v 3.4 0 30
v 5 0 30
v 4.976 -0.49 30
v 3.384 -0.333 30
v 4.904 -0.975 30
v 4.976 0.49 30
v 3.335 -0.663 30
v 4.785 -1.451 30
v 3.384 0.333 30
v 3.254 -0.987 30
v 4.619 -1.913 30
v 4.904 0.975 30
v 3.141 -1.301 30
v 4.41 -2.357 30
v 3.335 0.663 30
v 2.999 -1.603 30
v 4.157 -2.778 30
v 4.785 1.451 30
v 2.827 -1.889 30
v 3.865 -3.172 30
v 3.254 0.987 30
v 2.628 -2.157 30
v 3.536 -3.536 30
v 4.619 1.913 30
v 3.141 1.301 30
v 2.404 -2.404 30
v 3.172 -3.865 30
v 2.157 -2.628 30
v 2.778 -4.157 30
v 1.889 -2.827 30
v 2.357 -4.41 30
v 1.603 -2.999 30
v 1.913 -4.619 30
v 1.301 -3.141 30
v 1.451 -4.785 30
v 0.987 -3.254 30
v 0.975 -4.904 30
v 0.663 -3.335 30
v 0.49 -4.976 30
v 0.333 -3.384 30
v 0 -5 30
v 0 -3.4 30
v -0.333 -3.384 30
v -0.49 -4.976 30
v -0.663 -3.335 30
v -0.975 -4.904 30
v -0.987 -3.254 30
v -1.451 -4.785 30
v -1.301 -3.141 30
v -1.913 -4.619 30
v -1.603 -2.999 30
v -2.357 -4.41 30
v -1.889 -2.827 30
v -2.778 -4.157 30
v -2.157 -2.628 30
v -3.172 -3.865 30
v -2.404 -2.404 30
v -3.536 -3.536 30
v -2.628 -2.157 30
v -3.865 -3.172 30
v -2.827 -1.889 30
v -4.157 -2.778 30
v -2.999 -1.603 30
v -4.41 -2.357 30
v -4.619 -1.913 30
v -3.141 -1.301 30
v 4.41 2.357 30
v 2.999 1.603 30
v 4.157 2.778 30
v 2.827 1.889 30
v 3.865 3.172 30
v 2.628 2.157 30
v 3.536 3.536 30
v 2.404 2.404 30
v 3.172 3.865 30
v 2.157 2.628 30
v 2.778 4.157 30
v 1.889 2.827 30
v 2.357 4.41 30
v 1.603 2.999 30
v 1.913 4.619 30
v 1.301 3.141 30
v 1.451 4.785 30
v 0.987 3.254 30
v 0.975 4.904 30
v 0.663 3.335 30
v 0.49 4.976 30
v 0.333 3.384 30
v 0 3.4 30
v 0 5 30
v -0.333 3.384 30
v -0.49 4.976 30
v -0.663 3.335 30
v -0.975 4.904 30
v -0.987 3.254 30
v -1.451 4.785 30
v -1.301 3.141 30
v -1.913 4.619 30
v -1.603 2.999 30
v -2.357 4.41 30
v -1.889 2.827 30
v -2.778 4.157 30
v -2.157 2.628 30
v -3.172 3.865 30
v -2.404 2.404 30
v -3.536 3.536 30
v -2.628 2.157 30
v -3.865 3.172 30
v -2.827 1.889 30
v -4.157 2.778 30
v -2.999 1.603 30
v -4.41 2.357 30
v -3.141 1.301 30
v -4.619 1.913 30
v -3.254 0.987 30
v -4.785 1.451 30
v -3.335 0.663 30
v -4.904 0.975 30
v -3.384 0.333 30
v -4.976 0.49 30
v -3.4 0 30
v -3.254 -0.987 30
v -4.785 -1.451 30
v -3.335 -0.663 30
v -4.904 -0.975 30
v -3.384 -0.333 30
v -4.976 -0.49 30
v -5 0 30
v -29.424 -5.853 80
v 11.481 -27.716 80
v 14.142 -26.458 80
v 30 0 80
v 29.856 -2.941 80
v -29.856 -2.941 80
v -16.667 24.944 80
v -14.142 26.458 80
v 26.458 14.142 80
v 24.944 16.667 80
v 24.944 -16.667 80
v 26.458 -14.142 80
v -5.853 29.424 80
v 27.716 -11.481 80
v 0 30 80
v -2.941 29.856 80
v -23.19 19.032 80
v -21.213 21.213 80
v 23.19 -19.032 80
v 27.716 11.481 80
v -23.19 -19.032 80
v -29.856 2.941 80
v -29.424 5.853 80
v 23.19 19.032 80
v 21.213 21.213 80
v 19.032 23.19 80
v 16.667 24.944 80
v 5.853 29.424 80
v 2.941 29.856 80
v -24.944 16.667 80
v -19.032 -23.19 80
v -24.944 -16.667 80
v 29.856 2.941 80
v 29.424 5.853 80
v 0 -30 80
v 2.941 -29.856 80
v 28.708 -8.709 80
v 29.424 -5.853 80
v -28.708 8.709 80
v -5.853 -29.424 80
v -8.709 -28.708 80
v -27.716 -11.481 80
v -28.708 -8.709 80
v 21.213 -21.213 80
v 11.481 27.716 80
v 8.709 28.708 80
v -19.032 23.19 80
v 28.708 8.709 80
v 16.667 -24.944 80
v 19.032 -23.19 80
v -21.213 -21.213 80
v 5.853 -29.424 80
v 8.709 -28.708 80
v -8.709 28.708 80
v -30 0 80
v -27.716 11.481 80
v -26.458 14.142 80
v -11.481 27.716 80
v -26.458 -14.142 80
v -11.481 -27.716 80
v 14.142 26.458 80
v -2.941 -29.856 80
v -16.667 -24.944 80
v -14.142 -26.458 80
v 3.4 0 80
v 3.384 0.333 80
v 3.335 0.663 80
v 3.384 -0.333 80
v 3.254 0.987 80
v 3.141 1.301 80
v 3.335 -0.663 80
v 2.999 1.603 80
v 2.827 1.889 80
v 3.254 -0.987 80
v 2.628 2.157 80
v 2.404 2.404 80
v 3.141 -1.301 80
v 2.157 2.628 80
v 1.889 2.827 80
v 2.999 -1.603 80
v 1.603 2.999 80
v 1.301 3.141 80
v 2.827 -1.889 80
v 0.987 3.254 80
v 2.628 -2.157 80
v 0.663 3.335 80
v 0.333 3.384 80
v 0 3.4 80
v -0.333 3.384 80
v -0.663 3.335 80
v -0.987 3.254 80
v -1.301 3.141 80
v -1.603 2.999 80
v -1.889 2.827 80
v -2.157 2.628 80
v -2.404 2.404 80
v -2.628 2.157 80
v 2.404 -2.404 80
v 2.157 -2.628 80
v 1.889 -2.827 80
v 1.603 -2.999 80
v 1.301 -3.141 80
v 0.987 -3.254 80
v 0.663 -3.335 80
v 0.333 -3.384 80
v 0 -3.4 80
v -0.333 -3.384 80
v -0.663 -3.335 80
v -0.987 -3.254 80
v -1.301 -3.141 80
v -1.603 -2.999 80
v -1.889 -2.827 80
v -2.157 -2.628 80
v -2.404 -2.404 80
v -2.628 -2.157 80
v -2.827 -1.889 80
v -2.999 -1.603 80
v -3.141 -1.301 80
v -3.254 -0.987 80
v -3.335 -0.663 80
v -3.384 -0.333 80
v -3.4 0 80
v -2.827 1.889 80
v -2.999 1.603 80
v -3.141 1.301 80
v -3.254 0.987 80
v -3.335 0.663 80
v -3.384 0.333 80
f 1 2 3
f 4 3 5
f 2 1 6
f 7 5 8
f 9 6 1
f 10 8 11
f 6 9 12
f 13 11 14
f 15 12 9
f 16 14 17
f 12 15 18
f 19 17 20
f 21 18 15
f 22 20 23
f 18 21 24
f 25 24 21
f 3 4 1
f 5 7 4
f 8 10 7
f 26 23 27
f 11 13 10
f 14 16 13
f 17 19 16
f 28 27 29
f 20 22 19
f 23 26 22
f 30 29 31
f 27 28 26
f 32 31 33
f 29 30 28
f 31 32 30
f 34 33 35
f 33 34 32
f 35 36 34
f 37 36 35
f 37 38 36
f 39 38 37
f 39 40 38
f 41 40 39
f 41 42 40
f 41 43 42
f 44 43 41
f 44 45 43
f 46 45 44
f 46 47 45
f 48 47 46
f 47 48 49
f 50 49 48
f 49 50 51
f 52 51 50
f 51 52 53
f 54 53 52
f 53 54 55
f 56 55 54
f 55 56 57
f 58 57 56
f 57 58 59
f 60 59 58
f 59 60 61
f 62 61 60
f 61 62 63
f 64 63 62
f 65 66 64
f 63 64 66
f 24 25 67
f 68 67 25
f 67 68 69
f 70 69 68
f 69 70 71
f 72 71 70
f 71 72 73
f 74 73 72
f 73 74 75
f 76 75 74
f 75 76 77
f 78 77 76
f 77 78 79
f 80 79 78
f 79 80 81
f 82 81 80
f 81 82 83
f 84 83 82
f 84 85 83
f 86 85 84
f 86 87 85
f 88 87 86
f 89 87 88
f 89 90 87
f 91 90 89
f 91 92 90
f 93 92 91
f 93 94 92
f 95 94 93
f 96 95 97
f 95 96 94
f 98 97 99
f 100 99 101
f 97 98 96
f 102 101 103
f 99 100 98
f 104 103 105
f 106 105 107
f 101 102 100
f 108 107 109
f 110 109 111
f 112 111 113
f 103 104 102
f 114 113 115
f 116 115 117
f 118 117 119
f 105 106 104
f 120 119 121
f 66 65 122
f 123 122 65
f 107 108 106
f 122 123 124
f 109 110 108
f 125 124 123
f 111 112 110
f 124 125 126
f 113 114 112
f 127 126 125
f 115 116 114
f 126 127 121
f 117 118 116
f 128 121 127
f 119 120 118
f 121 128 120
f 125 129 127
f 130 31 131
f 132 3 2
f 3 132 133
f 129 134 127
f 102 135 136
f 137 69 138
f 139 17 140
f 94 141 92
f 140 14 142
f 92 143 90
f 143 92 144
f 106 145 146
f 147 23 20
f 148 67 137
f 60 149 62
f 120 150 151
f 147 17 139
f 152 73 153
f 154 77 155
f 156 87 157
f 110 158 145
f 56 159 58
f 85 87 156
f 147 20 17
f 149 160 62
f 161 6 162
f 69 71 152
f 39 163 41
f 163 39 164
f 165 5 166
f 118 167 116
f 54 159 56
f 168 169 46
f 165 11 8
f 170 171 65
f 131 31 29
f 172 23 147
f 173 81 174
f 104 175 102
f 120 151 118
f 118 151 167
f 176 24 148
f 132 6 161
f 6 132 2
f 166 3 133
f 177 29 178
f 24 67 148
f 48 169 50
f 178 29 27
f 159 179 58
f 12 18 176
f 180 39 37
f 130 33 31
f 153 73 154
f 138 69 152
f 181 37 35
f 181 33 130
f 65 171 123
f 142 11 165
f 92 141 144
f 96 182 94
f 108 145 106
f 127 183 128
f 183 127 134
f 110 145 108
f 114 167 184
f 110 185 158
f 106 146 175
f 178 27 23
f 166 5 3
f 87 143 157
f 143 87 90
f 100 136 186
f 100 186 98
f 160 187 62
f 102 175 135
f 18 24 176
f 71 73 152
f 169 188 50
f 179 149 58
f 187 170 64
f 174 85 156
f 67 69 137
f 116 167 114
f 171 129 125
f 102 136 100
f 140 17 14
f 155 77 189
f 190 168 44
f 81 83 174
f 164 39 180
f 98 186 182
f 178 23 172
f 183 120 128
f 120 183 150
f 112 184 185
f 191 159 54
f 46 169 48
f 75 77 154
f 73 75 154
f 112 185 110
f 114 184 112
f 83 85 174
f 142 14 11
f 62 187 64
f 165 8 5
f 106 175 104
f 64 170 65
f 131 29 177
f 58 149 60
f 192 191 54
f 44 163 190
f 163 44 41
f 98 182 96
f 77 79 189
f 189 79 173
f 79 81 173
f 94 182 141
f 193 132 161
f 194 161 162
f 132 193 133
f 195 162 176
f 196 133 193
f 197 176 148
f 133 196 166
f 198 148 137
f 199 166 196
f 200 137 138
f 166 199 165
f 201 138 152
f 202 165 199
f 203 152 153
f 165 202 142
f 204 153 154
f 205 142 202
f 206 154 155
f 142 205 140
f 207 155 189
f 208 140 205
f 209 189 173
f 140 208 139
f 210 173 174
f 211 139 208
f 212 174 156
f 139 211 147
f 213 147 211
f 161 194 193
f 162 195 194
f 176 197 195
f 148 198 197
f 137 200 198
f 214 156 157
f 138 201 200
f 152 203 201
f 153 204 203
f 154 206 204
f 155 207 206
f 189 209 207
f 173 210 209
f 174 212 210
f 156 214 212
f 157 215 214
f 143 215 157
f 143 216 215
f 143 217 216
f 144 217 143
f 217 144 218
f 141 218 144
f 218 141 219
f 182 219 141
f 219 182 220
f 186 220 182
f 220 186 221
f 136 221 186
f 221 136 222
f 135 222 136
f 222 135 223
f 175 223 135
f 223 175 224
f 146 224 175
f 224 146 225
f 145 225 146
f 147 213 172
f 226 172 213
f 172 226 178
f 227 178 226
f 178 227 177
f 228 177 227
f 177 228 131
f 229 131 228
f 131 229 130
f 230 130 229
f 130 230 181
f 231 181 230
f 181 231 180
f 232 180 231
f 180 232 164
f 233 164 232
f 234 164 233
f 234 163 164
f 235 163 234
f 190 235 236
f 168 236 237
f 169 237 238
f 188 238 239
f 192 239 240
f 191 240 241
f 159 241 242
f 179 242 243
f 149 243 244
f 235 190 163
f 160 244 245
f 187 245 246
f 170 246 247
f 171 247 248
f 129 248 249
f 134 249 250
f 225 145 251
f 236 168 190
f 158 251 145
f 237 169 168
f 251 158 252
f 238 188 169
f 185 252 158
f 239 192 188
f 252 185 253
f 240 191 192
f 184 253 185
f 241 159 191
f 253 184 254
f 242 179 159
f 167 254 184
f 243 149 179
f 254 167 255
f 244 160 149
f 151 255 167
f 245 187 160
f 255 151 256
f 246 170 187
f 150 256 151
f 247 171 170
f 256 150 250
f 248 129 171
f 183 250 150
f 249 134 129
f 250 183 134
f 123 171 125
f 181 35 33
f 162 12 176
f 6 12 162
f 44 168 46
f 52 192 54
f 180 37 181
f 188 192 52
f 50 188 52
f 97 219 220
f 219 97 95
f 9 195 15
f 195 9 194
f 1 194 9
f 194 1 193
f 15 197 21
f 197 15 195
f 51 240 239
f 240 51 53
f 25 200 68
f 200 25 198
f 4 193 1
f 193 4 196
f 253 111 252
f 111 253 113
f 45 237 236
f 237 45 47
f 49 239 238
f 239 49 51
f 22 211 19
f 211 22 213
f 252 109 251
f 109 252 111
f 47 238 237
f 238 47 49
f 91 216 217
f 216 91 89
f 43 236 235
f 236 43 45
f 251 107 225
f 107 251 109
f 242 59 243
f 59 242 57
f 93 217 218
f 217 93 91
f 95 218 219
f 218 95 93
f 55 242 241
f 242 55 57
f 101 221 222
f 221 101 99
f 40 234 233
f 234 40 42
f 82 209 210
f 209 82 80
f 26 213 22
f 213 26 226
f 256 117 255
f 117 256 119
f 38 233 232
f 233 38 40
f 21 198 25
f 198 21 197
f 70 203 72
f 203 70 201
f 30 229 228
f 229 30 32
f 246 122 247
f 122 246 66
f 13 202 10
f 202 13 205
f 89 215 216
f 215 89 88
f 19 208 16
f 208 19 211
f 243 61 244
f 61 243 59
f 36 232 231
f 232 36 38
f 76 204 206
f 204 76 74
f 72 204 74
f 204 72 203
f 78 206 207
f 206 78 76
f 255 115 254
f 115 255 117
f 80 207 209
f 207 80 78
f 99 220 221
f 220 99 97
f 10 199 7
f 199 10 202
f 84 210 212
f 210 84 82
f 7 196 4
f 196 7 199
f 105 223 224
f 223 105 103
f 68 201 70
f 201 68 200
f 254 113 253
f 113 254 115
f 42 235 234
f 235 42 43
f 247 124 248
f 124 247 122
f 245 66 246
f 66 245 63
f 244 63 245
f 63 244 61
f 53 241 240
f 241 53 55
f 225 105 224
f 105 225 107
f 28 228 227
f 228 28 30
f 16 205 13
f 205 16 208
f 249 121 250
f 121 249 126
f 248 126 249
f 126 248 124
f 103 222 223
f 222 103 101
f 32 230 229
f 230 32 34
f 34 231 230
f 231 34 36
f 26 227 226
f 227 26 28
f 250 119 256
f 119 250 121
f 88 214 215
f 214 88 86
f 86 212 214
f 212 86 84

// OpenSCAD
// Funnel - a spout (tube) with a conical section above, open at both ends. NOVEL general part.
//

spout_d  = 10;
spout_l  = 20;
cone_top = 10;
cone_rim = 60;
wall     = 1.6;

$fn = 64;

ib = max(1.6, spout_d - 2 * wall);   // keep a bore even if the wall is thicker than the diameter

translate([0, 0, spout_l + cone_top])          // rest the cone tip on the spout end (z = 0)
difference() {
    union() {
        cylinder(h = spout_l, d = spout_d);                 // spout (tube)
        cylinder(h = cone_rim - cone_top, d1 = cone_top, d2 = cone_rim);    // cone above it
    }
    translate([0, 0, -1])
    cylinder(h = spout_l + cone_rim - cone_top + 2, d = ib);       // through-bore
}
